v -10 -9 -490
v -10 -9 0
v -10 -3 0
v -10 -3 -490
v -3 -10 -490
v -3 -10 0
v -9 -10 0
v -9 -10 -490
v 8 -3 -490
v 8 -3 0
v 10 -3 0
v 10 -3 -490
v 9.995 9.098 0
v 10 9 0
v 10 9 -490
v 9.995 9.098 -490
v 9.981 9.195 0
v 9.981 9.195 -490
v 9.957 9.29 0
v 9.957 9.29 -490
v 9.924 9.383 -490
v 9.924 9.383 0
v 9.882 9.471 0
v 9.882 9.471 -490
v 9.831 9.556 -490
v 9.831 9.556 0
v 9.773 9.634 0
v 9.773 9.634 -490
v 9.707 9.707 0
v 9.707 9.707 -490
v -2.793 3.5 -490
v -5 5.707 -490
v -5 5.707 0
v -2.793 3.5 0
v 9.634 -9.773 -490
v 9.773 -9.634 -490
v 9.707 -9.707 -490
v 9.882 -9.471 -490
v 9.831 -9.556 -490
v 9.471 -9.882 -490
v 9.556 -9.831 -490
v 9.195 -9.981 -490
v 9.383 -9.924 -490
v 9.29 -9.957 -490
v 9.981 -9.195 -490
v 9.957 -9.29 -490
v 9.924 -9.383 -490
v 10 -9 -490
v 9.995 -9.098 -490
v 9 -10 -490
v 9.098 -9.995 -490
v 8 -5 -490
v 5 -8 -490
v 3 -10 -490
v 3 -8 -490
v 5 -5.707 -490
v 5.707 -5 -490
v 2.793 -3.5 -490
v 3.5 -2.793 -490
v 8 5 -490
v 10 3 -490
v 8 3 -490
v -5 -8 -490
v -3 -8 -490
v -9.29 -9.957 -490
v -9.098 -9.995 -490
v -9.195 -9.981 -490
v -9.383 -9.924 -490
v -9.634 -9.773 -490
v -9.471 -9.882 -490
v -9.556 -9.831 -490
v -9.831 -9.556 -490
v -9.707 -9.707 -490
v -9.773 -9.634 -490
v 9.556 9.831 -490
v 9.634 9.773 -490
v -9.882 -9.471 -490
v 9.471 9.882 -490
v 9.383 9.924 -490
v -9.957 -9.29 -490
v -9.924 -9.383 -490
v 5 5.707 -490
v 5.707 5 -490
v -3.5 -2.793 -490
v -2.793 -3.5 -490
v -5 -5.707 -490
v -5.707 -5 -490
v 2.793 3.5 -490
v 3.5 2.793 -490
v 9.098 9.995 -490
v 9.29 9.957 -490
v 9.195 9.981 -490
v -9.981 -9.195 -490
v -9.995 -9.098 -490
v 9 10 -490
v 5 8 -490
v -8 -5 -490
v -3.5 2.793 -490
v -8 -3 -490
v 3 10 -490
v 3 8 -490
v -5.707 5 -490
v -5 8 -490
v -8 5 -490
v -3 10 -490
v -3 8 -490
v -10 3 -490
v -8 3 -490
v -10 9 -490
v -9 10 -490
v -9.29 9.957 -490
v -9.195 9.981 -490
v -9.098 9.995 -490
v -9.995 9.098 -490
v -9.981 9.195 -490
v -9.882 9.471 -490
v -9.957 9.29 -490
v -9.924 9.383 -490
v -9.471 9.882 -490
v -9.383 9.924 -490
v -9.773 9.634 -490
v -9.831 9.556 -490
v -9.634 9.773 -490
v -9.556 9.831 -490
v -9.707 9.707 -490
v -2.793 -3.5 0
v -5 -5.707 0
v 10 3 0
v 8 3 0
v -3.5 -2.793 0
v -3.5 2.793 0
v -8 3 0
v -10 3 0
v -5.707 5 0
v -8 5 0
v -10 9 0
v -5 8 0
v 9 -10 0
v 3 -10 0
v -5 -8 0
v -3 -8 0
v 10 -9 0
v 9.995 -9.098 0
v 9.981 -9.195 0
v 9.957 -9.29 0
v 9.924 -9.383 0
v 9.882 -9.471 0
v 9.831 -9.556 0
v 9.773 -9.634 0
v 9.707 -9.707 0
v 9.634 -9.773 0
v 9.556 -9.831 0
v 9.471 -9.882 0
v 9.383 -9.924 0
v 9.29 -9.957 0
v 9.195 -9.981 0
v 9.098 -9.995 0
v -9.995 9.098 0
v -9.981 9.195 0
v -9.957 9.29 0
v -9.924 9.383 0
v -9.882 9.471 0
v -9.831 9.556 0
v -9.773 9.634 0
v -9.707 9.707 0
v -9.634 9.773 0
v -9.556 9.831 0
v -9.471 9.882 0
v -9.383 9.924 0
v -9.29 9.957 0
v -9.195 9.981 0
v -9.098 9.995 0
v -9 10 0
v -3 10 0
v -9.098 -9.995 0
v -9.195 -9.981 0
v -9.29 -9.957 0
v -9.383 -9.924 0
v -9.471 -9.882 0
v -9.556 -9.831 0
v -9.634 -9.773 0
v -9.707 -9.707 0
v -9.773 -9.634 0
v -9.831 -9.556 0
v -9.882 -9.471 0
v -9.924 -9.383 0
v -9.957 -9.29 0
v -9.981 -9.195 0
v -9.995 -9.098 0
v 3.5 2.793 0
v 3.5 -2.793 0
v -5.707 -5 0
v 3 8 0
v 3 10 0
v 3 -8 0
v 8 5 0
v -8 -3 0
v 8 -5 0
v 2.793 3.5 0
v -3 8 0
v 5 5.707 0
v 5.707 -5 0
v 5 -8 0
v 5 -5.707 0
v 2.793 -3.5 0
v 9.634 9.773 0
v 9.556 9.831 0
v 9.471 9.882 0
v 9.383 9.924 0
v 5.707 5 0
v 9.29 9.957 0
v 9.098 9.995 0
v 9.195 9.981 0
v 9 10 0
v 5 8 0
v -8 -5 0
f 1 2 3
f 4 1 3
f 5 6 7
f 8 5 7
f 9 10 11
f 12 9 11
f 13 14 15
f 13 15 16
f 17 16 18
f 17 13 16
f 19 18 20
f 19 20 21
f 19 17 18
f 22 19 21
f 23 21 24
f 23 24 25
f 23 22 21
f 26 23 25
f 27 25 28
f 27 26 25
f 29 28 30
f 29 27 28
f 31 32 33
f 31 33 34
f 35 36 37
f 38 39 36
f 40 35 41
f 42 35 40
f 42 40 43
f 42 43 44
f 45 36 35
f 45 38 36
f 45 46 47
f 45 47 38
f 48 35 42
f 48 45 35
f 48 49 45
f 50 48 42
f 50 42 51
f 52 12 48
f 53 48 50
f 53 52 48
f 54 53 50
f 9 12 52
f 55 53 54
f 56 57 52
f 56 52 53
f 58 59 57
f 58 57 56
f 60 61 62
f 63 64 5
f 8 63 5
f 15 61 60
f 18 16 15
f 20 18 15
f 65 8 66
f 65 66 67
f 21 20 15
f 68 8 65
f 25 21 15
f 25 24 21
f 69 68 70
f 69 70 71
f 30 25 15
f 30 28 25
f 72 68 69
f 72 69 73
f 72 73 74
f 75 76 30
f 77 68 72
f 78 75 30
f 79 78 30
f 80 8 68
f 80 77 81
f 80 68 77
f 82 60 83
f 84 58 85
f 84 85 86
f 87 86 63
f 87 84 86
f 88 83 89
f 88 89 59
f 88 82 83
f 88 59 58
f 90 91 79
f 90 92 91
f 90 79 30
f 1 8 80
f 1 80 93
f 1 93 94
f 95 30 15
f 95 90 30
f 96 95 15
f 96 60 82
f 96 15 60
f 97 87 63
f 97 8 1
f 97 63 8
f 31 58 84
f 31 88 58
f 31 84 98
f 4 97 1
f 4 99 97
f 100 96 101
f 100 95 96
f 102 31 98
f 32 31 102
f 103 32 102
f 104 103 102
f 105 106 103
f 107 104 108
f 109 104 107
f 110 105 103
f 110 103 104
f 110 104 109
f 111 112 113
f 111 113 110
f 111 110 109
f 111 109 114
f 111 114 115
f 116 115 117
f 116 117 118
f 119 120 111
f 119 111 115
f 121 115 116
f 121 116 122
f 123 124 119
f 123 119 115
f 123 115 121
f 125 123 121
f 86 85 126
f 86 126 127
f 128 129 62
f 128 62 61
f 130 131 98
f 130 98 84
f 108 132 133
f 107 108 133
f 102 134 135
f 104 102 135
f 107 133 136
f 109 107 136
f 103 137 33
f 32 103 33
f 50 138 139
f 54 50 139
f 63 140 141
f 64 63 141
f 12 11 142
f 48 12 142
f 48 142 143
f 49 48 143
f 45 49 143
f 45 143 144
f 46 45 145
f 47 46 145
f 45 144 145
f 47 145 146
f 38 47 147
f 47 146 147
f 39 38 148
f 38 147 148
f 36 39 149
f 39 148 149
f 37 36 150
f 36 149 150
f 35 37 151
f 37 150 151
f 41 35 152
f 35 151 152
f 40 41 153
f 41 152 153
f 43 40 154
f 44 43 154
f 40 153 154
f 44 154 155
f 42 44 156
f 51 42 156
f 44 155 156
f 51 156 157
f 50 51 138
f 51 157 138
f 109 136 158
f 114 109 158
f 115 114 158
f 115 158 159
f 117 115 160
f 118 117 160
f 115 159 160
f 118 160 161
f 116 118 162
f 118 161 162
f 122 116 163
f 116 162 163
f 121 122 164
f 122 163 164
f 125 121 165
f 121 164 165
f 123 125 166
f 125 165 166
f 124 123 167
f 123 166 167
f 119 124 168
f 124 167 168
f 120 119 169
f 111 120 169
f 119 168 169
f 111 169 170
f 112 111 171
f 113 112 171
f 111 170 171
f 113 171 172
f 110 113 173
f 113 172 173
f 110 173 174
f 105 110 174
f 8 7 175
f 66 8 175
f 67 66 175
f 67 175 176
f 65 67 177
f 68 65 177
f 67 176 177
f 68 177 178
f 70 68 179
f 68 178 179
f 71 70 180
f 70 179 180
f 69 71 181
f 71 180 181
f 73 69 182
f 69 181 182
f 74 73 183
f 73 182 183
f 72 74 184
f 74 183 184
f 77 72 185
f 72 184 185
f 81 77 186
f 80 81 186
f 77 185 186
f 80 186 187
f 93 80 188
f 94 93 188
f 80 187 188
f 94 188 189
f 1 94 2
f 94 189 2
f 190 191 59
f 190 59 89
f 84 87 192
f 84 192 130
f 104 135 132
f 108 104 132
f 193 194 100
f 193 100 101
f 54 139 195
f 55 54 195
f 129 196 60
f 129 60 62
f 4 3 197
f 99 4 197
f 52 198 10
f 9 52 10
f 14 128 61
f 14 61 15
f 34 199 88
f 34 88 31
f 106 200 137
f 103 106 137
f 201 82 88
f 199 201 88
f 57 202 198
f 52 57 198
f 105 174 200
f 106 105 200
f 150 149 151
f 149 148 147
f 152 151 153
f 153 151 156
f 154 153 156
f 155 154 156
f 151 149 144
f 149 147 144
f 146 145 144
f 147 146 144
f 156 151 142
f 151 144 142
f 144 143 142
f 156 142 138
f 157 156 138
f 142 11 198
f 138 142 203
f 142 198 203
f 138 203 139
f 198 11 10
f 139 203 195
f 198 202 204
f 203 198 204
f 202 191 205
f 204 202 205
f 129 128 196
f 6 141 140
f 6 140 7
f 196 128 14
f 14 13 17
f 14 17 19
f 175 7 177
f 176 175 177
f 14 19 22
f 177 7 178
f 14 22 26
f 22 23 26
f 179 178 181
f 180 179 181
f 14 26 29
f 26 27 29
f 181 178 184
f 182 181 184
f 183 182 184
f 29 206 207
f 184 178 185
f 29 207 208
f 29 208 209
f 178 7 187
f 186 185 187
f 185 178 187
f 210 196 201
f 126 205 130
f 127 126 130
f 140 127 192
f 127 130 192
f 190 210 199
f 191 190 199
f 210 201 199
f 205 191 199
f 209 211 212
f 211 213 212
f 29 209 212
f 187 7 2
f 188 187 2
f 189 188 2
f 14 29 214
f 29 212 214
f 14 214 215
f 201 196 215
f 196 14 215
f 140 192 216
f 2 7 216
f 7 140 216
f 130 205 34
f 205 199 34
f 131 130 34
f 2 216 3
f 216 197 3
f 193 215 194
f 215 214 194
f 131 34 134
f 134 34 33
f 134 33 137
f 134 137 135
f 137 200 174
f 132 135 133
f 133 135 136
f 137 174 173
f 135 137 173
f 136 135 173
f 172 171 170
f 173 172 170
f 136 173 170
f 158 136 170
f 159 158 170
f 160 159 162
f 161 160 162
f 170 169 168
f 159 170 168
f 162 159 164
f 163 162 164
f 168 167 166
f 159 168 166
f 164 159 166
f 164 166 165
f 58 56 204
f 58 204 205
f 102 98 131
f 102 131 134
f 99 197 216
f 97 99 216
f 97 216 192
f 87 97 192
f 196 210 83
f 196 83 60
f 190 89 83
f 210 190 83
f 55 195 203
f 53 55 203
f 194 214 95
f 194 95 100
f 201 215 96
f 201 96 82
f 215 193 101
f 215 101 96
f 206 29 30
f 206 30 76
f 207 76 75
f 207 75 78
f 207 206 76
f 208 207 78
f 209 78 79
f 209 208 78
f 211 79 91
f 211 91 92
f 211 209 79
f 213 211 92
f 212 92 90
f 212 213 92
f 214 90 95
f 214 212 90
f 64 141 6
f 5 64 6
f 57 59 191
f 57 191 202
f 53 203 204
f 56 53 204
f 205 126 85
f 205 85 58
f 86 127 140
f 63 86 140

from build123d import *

# Parameters (mm, degrees)
BOSS_EXTRUDE1_DEPTH = 490


with BuildPart() as part:
    # Sketch1 → Boss-Extrude1 (new body)
    with BuildSketch(Plane.XY):
        with BuildLine():
            Line((-9, 10), (-3, 10))
            Line((-3, 10), (-3, 8))
            Line((-3, 8), (-5, 8))
            Line((-5, 8), (-5, 5.707106781))
            Line((-5, 5.707106781), (-2.792893219, 3.5))
            Line((-2.792893219, 3.5), (0, 3.5))
            Line((0, 3.5), (0, 0))
            Line((0, 0), (-3.5, 0))
            Line((-3.5, 0), (-3.5, 2.792893219))
            Line((-3.5, 2.792893219), (-5.707106781, 5))
            Line((-5.707106781, 5), (-8, 5))
            Line((-8, 5), (-8, 3))
            Line((-8, 3), (-10, 3))
            Line((-10, 3), (-10, 9))
            ThreePointArc((-10, 9), (-9.707106781, 9.707106781), (-9, 10))
        make_face()
        with BuildLine():
            Line((9.707106781, 9.707106781), (0, 0))
            Line((0, 0), (3.5, 0))
            Line((3.5, 0), (3.5, 2.792893219))
            Line((3.5, 2.792893219), (5.707106781, 5))
            Line((5.707106781, 5), (8, 5))
            Line((8, 5), (8, 3))
            Line((8, 3), (10, 3))
            Line((10, 3), (10, 9))
            ThreePointArc((10, 9), (9.923879533, 9.382683432), (9.707106781, 9.707106781))
        make_face()
        with BuildLine():
            Line((0, 3.5), (0, 0))
            Line((0, 0), (9.707106781, 9.707106781))
            ThreePointArc((9.707106781, 9.707106781), (9.382683432, 9.923879533), (9, 10))
            Line((9, 10), (3, 10))
            Line((3, 10), (3, 8))
            Line((3, 8), (5, 8))
            Line((5, 8), (5, 5.707106781))
            Line((5, 5.707106781), (2.792893219, 3.5))
            Line((2.792893219, 3.5), (0, 3.5))
        make_face()
        with BuildLine():
            Line((-10, -9), (-10, -3))
            Line((-10, -3), (-8, -3))
            Line((-8, -3), (-8, -5))
            Line((-8, -5), (-5.707106781, -5))
            Line((-5.707106781, -5), (-3.5, -2.792893219))
            Line((-3.5, -2.792893219), (-3.5, 0))
            Line((-3.5, 0), (0, 0))
            Line((0, 0), (0, -3.5))
            Line((0, -3.5), (-2.792893219, -3.5))
            Line((-2.792893219, -3.5), (-5, -5.707106781))
            Line((-5, -5.707106781), (-5, -8))
            Line((-5, -8), (-3, -8))
            Line((-3, -8), (-3, -10))
            Line((-3, -10), (-9, -10))
            ThreePointArc((-9, -10), (-9.707106781, -9.707106781), (-10, -9))
        make_face()
        with BuildLine():
            Line((9, -10), (3, -10))
            Line((3, -10), (3, -8))
            Line((3, -8), (5, -8))
            Line((5, -8), (5, -5.707106781))
            Line((5, -5.707106781), (2.792893219, -3.5))
            Line((2.792893219, -3.5), (0, -3.5))
            Line((0, -3.5), (0, 0))
            Line((0, 0), (3.5, 0))
            Line((3.5, 0), (3.5, -2.792893219))
            Line((3.5, -2.792893219), (5.707106781, -5))
            Line((5.707106781, -5), (8, -5))
            Line((8, -5), (8, -3))
            Line((8, -3), (10, -3))
            Line((10, -3), (10, -9))
            ThreePointArc((10, -9), (9.707106781, -9.707106781), (9, -10))
        make_face()
    extrude(amount=-BOSS_EXTRUDE1_DEPTH)


solid = part.part
